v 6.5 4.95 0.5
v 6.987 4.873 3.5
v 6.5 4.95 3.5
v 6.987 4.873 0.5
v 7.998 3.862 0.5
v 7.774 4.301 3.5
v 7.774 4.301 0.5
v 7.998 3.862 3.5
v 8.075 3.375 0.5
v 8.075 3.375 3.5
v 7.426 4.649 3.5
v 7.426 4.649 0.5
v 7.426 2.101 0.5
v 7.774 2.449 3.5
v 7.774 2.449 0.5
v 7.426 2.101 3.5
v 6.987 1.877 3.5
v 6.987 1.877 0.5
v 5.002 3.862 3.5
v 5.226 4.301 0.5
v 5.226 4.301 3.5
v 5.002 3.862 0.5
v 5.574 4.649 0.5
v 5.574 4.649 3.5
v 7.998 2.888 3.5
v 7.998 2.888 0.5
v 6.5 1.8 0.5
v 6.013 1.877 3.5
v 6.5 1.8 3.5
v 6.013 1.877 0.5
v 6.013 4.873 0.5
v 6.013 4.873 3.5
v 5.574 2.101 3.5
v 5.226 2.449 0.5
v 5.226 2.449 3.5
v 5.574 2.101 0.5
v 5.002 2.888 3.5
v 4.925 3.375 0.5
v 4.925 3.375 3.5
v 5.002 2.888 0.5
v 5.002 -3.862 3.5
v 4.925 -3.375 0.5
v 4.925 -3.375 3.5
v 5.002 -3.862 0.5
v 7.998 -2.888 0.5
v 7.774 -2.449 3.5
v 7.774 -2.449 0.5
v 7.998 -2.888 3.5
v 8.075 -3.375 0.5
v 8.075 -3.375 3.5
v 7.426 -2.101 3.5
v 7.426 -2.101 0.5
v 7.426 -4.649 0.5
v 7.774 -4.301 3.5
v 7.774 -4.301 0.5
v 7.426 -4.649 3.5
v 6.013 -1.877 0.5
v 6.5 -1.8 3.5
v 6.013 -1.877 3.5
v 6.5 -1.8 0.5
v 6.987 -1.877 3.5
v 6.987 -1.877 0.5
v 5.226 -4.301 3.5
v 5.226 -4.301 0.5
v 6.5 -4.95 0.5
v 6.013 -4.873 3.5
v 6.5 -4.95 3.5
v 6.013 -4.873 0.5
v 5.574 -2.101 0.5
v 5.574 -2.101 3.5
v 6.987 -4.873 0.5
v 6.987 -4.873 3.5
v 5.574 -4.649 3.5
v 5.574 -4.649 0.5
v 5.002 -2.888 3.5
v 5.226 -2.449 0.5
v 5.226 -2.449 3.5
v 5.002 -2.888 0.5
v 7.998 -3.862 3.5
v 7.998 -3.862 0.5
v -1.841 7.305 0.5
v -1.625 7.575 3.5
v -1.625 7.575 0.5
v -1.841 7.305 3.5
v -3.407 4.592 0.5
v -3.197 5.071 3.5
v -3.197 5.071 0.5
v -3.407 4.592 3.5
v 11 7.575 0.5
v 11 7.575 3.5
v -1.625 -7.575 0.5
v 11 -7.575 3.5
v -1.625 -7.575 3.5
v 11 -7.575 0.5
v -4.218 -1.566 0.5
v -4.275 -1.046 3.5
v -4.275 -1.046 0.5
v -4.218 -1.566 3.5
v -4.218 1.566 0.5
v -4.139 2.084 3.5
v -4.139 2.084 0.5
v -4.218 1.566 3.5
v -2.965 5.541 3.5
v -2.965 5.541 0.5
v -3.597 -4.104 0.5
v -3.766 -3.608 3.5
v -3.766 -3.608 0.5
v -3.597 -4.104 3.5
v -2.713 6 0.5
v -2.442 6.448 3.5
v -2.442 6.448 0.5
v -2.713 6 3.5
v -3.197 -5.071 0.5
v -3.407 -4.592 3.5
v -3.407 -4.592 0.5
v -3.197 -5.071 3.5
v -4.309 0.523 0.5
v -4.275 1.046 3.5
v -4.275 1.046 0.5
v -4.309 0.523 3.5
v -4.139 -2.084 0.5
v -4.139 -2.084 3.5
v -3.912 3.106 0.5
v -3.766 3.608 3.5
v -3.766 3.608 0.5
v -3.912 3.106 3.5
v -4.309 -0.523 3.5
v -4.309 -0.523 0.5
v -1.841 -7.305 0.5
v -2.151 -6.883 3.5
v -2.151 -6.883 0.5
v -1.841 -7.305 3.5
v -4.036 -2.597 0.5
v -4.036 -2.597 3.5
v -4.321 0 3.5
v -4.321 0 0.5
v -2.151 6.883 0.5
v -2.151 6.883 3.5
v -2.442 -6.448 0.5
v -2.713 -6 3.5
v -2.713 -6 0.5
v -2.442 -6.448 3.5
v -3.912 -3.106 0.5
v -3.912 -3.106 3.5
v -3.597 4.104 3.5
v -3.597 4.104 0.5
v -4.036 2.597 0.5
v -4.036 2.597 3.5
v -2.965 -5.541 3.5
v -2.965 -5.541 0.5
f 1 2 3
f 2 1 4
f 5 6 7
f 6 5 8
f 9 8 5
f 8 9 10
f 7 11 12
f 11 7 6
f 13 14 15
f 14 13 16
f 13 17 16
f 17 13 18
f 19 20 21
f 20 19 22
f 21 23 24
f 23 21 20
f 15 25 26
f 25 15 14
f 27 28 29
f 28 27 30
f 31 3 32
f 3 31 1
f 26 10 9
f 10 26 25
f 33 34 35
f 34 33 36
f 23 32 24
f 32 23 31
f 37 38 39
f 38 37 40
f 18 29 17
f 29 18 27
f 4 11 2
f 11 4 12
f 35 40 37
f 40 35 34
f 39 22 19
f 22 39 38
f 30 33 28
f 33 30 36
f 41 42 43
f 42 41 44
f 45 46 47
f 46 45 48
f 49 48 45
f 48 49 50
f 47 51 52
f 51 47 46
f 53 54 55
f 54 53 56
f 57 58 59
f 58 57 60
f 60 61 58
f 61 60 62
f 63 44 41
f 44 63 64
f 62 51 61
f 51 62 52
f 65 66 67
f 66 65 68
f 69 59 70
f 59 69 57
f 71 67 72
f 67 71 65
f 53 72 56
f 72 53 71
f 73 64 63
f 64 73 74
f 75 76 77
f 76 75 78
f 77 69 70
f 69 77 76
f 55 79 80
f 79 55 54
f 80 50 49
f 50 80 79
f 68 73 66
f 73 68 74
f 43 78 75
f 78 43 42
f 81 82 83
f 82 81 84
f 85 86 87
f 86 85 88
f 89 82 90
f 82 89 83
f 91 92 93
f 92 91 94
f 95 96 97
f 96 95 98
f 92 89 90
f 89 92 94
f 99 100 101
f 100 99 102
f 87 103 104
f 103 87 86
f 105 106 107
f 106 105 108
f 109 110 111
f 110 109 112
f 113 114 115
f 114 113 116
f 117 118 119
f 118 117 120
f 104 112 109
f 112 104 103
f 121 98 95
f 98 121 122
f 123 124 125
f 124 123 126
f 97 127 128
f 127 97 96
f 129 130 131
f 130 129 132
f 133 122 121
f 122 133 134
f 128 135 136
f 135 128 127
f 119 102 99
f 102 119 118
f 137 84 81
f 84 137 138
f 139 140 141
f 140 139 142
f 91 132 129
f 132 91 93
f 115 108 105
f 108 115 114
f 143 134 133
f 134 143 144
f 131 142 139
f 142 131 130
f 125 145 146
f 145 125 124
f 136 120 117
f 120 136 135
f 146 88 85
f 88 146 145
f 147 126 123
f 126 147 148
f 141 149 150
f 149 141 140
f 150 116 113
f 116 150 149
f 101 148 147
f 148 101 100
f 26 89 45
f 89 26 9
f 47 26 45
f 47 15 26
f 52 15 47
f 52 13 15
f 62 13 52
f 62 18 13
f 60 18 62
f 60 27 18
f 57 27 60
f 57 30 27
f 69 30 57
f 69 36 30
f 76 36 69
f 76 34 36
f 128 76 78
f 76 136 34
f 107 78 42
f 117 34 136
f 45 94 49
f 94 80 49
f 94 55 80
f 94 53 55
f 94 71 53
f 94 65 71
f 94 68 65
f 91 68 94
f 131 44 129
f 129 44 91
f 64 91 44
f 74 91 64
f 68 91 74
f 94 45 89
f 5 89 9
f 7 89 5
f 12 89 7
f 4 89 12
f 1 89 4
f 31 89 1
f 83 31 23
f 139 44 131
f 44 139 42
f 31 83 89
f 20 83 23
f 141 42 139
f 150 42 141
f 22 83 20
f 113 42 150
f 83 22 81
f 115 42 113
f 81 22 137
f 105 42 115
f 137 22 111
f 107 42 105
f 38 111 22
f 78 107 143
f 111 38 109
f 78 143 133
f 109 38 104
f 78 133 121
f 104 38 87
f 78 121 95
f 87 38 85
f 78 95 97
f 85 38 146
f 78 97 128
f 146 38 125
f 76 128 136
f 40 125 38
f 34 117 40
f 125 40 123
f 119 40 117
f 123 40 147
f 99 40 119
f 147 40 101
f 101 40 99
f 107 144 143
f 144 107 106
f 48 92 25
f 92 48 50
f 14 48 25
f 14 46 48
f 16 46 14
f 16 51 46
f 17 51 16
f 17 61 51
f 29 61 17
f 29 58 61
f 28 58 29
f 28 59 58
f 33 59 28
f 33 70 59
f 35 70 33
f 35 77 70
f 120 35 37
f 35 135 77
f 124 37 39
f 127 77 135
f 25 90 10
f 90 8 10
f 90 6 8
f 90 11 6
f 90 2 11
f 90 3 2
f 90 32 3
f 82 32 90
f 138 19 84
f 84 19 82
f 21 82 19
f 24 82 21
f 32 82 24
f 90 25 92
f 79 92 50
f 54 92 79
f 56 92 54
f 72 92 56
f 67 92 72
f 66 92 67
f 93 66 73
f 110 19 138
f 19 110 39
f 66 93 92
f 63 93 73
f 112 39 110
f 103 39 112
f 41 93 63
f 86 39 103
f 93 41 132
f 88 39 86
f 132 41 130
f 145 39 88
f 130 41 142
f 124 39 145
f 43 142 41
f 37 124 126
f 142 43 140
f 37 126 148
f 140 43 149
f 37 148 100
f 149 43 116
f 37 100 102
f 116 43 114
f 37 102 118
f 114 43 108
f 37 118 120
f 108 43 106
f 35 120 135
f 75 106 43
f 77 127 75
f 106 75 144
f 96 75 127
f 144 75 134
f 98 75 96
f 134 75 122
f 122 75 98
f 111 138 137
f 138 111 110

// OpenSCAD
include <FullAssembly.scad>
/* [Hidden] */
isStandalone=false;

// Mirror Clip
topclip(cbump,clipbolt,collbolt,clipthick,clipext,pri_mdia);
